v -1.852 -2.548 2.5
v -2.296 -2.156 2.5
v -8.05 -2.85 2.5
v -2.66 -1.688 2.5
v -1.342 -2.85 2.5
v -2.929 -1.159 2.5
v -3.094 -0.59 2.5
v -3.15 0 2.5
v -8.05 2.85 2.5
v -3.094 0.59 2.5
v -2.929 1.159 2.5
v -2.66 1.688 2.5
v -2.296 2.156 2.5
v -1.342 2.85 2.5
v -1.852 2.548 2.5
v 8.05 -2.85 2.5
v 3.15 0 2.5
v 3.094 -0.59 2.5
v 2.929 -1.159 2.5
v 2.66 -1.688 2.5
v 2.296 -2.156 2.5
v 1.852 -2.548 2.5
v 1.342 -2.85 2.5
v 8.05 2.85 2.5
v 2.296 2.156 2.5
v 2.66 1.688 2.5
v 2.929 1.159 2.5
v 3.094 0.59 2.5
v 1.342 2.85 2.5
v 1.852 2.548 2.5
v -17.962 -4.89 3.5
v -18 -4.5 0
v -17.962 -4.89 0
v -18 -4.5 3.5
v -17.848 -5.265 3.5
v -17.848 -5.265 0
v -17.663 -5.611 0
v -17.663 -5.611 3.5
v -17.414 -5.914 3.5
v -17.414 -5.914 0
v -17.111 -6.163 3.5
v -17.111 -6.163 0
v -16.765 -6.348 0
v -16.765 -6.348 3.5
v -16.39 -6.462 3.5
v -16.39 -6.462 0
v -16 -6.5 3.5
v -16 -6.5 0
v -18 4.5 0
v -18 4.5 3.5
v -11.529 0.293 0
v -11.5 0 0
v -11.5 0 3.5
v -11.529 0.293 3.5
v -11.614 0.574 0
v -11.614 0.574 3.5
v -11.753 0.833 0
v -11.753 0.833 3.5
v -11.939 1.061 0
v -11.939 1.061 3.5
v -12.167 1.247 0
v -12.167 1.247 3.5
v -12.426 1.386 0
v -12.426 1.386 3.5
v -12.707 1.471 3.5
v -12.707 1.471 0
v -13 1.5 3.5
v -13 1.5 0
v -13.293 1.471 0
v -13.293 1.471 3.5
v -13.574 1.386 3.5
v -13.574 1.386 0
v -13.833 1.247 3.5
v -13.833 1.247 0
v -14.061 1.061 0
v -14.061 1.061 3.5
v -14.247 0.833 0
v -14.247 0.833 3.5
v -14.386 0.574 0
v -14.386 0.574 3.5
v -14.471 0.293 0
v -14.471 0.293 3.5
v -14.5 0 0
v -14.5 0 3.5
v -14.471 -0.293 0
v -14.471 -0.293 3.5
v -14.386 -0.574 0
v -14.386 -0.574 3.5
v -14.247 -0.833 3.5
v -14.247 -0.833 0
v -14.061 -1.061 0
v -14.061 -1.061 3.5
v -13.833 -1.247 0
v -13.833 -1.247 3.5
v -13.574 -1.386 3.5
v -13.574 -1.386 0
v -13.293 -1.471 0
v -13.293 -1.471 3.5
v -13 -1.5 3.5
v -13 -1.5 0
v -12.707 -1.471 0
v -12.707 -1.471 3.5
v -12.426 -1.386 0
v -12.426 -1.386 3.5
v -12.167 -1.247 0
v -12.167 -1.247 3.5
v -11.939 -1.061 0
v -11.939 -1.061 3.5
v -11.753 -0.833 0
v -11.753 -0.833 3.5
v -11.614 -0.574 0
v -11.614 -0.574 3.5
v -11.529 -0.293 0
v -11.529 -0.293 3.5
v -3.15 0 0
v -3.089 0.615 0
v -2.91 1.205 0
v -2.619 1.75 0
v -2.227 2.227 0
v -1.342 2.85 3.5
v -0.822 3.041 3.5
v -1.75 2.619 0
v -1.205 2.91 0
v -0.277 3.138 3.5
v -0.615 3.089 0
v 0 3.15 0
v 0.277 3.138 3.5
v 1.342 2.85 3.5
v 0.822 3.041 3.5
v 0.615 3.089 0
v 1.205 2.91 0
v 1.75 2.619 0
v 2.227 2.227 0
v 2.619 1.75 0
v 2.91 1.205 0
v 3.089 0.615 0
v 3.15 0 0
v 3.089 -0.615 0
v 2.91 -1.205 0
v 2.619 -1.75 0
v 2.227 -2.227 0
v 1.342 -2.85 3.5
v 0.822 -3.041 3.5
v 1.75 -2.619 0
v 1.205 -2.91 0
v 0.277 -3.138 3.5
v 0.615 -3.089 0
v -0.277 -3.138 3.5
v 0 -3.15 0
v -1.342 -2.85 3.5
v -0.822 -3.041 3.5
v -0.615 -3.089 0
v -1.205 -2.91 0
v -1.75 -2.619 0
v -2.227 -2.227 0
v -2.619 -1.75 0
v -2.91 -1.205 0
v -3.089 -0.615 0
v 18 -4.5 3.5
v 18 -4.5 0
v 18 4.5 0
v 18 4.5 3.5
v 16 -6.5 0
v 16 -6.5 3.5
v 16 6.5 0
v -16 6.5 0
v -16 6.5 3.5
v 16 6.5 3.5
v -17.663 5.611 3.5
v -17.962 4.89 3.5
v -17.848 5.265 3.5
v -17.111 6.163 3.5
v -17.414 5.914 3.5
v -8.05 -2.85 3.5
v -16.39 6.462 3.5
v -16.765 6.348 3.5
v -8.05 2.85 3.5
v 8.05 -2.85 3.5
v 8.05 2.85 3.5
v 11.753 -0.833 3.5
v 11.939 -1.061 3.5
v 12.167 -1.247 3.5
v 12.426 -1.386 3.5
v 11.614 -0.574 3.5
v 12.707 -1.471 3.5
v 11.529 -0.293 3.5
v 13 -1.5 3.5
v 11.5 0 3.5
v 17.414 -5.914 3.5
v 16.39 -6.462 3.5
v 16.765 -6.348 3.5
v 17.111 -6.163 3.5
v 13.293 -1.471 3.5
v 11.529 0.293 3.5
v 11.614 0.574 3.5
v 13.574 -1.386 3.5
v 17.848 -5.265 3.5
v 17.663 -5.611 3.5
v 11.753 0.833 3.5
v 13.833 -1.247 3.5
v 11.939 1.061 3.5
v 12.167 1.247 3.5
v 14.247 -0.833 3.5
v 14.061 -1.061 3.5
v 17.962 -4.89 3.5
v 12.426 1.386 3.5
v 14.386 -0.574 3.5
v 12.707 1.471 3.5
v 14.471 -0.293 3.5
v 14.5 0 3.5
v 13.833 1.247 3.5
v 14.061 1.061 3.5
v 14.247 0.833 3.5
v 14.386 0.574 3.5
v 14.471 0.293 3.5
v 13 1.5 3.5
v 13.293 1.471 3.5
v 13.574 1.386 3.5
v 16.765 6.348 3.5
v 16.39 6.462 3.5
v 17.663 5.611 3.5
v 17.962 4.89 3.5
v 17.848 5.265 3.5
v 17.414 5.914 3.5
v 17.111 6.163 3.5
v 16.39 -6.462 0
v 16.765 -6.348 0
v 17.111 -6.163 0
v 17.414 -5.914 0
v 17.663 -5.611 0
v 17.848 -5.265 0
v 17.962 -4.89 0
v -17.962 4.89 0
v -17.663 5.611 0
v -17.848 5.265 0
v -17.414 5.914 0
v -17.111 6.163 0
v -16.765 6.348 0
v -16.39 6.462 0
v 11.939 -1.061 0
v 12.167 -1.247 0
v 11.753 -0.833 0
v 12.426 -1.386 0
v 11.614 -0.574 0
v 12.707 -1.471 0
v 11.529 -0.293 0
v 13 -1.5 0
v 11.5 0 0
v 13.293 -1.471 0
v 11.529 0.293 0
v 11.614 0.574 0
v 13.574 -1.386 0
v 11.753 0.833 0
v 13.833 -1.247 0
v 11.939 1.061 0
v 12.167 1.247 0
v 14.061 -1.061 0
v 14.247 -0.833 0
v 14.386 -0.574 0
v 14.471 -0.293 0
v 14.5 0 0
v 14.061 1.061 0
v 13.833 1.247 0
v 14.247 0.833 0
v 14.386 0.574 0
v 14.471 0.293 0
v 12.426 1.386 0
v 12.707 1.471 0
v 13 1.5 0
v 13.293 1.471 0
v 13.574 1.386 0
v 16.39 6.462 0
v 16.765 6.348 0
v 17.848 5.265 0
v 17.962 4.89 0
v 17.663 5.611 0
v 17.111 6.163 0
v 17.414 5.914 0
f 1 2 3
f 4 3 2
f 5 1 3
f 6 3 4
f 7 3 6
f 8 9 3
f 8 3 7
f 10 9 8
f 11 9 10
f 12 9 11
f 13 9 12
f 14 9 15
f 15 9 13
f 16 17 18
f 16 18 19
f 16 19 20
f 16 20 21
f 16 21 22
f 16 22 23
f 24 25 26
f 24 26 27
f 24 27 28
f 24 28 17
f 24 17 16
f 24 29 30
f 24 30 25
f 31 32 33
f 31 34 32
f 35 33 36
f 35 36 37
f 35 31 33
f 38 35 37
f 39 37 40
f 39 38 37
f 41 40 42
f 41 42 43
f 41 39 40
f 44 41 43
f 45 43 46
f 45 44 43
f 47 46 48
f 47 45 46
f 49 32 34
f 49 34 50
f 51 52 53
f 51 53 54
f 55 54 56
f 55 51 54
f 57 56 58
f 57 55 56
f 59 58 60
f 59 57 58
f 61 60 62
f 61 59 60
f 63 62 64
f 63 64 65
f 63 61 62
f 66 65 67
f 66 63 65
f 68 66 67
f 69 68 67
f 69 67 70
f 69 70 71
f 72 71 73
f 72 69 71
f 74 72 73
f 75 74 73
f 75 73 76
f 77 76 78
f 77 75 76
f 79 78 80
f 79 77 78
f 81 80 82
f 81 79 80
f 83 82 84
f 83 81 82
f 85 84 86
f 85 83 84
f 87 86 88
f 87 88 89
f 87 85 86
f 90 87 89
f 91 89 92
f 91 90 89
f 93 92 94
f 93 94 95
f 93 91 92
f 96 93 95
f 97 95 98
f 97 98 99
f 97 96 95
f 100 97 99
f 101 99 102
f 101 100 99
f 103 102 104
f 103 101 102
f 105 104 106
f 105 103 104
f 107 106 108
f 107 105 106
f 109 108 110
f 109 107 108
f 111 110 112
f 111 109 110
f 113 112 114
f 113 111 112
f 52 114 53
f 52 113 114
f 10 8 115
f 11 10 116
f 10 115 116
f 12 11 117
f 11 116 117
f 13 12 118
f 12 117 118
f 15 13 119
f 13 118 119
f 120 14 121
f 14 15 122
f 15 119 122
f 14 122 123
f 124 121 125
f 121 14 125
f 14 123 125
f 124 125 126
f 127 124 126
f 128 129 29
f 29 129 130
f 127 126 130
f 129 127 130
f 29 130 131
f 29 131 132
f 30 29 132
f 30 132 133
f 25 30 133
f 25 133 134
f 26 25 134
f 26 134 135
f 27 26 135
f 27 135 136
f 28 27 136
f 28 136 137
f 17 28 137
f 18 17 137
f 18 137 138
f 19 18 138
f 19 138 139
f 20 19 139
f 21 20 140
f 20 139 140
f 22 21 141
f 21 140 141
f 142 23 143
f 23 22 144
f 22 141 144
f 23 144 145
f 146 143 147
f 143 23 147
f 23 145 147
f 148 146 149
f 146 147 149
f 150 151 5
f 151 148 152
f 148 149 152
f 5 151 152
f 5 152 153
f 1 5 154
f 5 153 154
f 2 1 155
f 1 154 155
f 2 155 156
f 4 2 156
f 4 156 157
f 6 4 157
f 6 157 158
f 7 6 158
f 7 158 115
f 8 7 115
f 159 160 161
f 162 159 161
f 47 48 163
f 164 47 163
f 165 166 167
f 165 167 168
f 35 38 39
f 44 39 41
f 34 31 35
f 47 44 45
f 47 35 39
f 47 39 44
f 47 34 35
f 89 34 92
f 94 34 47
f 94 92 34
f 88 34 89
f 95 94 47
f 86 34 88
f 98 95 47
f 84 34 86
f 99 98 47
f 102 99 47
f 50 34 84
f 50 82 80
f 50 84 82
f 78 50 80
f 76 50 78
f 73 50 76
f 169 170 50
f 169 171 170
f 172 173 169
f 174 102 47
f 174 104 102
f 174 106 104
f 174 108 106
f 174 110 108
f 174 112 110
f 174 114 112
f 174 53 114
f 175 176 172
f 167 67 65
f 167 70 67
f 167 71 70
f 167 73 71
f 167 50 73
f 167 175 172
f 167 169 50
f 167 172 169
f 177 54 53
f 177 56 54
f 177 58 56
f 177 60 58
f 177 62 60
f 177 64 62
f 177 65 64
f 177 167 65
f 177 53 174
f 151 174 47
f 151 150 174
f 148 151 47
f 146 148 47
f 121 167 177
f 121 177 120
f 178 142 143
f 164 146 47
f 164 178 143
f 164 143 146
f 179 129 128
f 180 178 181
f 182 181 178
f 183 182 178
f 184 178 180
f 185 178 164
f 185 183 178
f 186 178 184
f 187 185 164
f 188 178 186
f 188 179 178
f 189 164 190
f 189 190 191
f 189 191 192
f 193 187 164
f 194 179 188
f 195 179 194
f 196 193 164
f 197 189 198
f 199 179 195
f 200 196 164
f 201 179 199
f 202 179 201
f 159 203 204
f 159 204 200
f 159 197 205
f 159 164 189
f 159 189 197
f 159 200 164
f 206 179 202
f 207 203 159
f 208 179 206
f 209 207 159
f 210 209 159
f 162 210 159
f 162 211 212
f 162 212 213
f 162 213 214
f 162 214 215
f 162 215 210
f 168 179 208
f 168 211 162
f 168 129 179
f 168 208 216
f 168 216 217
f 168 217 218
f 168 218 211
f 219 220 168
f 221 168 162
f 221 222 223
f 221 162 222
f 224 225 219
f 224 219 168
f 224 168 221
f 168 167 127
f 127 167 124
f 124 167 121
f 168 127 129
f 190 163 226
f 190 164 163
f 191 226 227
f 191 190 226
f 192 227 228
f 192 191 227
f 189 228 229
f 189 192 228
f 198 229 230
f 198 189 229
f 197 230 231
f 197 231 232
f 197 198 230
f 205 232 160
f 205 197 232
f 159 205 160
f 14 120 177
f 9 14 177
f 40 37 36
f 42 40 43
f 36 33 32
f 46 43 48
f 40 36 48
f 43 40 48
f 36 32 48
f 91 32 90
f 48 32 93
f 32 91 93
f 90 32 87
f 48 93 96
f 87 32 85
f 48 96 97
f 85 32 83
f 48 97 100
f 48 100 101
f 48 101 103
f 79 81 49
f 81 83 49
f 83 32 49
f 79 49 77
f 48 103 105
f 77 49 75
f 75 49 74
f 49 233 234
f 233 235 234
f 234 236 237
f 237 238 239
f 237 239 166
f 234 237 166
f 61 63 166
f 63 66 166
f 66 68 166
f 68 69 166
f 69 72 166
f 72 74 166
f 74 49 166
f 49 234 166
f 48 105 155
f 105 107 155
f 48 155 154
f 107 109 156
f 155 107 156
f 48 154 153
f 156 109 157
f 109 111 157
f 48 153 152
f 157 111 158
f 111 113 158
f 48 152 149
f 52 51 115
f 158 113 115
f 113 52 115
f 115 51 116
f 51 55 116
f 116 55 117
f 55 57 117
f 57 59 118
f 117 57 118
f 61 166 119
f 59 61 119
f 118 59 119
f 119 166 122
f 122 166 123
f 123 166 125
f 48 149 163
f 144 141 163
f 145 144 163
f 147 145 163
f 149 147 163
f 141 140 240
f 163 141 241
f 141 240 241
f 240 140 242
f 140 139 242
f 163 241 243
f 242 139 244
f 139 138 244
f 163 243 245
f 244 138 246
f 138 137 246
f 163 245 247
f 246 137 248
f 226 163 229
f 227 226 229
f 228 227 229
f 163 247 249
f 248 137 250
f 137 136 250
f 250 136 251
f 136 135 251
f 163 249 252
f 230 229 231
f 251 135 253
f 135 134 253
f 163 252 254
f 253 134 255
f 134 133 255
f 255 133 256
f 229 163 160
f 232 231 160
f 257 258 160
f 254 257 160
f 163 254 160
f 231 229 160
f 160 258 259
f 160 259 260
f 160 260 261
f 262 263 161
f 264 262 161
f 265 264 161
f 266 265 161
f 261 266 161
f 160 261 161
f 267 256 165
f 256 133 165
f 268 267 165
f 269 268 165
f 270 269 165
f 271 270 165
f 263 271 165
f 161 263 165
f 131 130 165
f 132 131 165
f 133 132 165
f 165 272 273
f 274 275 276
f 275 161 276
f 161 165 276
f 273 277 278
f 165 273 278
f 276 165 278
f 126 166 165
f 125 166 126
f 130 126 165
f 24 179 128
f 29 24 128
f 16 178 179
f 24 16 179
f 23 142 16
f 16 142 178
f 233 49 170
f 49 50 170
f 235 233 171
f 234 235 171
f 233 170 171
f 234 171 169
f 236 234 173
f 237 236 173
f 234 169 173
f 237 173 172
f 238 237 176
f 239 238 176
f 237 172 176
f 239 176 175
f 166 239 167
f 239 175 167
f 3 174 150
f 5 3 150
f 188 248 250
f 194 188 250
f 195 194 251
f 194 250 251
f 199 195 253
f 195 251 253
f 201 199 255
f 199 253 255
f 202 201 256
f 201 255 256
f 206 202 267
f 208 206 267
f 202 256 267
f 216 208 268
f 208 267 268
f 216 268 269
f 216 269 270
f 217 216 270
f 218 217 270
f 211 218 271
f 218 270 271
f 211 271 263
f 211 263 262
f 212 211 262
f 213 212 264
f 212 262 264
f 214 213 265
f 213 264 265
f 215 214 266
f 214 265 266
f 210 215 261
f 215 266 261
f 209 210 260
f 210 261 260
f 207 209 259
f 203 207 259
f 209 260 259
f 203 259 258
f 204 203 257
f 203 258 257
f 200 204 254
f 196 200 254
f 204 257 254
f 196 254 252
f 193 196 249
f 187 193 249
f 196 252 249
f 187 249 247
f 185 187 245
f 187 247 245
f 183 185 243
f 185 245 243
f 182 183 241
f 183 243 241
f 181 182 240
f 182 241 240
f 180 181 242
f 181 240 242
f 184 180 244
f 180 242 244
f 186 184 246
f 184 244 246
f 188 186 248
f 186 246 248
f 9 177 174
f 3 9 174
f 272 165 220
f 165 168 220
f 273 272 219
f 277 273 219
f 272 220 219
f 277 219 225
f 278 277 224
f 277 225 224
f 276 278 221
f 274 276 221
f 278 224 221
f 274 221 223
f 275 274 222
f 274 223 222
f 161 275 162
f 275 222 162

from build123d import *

# Parameters (mm, degrees)
F0_W     = 36
F0_H     = 13
F0_R     = 1.5
F1_DEPTH = 3.5
F2_R     = 2
F4_DEPTH = 1


with BuildPart() as f1:
    # F0 (on Top) → F1 (new body)
    with BuildSketch(Plane.XY):
        Rectangle(F0_W, F0_H)
        with Locations((-13, 0)):
            Circle(F0_R, mode=Mode.SUBTRACT)
        with BuildLine():
            ThreePointArc((3.15, 0), (0, -3.15), (-3.15, 0))
            ThreePointArc((-3.15, 0), (0, 3.15), (3.15, 0))
        make_face(mode=Mode.SUBTRACT)
        with BuildLine():
            ThreePointArc((14.5, 0), (13, -1.5), (11.5, 0))
            ThreePointArc((11.5, 0), (13, 1.5), (14.5, 0))
        make_face(mode=Mode.SUBTRACT)
    extrude(amount=F1_DEPTH)

    # F2
    f2_edges = [f1.edges().sort_by_distance(p)[0] for p in [
        (-18, 6.5, 1.75),
        (-18, -6.5, 1.75),
        (18, -6.5, 1.75),
        (18, 6.5, 1.75),
    ]]
    fillet(f2_edges, radius=F2_R)

    # F3 (on face) → F4 (cut)
    with BuildSketch(Plane.XY.offset(3.5)):
        with BuildLine():
            Line((-1.3416407865, 2.85), (-8.05, 2.85))
            Line((-8.05, 2.85), (-8.05, -2.85))
            Line((-8.05, -2.85), (-1.3416407865, -2.85))
            ThreePointArc((-1.3416407865, -2.85), (-3.15, 0), (-1.3416407865, 2.85))
        make_face()
        with BuildLine():
            Line((1.3416407865, 2.85), (-1.3416407865, 2.85))
            ThreePointArc((-1.3416407865, 2.85), (-3.15, 0), (-1.3416407865, -2.85))
            Line((-1.3416407865, -2.85), (1.3416407865, -2.85))
            ThreePointArc((1.3416407865, -2.85), (2.6597620643, -1.6876509595), (3.15, 0))
            ThreePointArc((3.15, 0), (2.6597620643, 1.6876509595), (1.3416407865, 2.85))
        make_face()
        with BuildLine():
            Line((8.05, 2.85), (1.3416407865, 2.85))
            ThreePointArc((1.3416407865, 2.85), (2.6597620643, 1.6876509595), (3.15, 0))
            ThreePointArc((3.15, 0), (2.6597620643, -1.6876509595), (1.3416407865, -2.85))
            Line((1.3416407865, -2.85), (8.05, -2.85))
            Line((8.05, -2.85), (8.05, 2.85))
        make_face()
    extrude(amount=-F4_DEPTH, mode=Mode.SUBTRACT)


solid = f1.part
